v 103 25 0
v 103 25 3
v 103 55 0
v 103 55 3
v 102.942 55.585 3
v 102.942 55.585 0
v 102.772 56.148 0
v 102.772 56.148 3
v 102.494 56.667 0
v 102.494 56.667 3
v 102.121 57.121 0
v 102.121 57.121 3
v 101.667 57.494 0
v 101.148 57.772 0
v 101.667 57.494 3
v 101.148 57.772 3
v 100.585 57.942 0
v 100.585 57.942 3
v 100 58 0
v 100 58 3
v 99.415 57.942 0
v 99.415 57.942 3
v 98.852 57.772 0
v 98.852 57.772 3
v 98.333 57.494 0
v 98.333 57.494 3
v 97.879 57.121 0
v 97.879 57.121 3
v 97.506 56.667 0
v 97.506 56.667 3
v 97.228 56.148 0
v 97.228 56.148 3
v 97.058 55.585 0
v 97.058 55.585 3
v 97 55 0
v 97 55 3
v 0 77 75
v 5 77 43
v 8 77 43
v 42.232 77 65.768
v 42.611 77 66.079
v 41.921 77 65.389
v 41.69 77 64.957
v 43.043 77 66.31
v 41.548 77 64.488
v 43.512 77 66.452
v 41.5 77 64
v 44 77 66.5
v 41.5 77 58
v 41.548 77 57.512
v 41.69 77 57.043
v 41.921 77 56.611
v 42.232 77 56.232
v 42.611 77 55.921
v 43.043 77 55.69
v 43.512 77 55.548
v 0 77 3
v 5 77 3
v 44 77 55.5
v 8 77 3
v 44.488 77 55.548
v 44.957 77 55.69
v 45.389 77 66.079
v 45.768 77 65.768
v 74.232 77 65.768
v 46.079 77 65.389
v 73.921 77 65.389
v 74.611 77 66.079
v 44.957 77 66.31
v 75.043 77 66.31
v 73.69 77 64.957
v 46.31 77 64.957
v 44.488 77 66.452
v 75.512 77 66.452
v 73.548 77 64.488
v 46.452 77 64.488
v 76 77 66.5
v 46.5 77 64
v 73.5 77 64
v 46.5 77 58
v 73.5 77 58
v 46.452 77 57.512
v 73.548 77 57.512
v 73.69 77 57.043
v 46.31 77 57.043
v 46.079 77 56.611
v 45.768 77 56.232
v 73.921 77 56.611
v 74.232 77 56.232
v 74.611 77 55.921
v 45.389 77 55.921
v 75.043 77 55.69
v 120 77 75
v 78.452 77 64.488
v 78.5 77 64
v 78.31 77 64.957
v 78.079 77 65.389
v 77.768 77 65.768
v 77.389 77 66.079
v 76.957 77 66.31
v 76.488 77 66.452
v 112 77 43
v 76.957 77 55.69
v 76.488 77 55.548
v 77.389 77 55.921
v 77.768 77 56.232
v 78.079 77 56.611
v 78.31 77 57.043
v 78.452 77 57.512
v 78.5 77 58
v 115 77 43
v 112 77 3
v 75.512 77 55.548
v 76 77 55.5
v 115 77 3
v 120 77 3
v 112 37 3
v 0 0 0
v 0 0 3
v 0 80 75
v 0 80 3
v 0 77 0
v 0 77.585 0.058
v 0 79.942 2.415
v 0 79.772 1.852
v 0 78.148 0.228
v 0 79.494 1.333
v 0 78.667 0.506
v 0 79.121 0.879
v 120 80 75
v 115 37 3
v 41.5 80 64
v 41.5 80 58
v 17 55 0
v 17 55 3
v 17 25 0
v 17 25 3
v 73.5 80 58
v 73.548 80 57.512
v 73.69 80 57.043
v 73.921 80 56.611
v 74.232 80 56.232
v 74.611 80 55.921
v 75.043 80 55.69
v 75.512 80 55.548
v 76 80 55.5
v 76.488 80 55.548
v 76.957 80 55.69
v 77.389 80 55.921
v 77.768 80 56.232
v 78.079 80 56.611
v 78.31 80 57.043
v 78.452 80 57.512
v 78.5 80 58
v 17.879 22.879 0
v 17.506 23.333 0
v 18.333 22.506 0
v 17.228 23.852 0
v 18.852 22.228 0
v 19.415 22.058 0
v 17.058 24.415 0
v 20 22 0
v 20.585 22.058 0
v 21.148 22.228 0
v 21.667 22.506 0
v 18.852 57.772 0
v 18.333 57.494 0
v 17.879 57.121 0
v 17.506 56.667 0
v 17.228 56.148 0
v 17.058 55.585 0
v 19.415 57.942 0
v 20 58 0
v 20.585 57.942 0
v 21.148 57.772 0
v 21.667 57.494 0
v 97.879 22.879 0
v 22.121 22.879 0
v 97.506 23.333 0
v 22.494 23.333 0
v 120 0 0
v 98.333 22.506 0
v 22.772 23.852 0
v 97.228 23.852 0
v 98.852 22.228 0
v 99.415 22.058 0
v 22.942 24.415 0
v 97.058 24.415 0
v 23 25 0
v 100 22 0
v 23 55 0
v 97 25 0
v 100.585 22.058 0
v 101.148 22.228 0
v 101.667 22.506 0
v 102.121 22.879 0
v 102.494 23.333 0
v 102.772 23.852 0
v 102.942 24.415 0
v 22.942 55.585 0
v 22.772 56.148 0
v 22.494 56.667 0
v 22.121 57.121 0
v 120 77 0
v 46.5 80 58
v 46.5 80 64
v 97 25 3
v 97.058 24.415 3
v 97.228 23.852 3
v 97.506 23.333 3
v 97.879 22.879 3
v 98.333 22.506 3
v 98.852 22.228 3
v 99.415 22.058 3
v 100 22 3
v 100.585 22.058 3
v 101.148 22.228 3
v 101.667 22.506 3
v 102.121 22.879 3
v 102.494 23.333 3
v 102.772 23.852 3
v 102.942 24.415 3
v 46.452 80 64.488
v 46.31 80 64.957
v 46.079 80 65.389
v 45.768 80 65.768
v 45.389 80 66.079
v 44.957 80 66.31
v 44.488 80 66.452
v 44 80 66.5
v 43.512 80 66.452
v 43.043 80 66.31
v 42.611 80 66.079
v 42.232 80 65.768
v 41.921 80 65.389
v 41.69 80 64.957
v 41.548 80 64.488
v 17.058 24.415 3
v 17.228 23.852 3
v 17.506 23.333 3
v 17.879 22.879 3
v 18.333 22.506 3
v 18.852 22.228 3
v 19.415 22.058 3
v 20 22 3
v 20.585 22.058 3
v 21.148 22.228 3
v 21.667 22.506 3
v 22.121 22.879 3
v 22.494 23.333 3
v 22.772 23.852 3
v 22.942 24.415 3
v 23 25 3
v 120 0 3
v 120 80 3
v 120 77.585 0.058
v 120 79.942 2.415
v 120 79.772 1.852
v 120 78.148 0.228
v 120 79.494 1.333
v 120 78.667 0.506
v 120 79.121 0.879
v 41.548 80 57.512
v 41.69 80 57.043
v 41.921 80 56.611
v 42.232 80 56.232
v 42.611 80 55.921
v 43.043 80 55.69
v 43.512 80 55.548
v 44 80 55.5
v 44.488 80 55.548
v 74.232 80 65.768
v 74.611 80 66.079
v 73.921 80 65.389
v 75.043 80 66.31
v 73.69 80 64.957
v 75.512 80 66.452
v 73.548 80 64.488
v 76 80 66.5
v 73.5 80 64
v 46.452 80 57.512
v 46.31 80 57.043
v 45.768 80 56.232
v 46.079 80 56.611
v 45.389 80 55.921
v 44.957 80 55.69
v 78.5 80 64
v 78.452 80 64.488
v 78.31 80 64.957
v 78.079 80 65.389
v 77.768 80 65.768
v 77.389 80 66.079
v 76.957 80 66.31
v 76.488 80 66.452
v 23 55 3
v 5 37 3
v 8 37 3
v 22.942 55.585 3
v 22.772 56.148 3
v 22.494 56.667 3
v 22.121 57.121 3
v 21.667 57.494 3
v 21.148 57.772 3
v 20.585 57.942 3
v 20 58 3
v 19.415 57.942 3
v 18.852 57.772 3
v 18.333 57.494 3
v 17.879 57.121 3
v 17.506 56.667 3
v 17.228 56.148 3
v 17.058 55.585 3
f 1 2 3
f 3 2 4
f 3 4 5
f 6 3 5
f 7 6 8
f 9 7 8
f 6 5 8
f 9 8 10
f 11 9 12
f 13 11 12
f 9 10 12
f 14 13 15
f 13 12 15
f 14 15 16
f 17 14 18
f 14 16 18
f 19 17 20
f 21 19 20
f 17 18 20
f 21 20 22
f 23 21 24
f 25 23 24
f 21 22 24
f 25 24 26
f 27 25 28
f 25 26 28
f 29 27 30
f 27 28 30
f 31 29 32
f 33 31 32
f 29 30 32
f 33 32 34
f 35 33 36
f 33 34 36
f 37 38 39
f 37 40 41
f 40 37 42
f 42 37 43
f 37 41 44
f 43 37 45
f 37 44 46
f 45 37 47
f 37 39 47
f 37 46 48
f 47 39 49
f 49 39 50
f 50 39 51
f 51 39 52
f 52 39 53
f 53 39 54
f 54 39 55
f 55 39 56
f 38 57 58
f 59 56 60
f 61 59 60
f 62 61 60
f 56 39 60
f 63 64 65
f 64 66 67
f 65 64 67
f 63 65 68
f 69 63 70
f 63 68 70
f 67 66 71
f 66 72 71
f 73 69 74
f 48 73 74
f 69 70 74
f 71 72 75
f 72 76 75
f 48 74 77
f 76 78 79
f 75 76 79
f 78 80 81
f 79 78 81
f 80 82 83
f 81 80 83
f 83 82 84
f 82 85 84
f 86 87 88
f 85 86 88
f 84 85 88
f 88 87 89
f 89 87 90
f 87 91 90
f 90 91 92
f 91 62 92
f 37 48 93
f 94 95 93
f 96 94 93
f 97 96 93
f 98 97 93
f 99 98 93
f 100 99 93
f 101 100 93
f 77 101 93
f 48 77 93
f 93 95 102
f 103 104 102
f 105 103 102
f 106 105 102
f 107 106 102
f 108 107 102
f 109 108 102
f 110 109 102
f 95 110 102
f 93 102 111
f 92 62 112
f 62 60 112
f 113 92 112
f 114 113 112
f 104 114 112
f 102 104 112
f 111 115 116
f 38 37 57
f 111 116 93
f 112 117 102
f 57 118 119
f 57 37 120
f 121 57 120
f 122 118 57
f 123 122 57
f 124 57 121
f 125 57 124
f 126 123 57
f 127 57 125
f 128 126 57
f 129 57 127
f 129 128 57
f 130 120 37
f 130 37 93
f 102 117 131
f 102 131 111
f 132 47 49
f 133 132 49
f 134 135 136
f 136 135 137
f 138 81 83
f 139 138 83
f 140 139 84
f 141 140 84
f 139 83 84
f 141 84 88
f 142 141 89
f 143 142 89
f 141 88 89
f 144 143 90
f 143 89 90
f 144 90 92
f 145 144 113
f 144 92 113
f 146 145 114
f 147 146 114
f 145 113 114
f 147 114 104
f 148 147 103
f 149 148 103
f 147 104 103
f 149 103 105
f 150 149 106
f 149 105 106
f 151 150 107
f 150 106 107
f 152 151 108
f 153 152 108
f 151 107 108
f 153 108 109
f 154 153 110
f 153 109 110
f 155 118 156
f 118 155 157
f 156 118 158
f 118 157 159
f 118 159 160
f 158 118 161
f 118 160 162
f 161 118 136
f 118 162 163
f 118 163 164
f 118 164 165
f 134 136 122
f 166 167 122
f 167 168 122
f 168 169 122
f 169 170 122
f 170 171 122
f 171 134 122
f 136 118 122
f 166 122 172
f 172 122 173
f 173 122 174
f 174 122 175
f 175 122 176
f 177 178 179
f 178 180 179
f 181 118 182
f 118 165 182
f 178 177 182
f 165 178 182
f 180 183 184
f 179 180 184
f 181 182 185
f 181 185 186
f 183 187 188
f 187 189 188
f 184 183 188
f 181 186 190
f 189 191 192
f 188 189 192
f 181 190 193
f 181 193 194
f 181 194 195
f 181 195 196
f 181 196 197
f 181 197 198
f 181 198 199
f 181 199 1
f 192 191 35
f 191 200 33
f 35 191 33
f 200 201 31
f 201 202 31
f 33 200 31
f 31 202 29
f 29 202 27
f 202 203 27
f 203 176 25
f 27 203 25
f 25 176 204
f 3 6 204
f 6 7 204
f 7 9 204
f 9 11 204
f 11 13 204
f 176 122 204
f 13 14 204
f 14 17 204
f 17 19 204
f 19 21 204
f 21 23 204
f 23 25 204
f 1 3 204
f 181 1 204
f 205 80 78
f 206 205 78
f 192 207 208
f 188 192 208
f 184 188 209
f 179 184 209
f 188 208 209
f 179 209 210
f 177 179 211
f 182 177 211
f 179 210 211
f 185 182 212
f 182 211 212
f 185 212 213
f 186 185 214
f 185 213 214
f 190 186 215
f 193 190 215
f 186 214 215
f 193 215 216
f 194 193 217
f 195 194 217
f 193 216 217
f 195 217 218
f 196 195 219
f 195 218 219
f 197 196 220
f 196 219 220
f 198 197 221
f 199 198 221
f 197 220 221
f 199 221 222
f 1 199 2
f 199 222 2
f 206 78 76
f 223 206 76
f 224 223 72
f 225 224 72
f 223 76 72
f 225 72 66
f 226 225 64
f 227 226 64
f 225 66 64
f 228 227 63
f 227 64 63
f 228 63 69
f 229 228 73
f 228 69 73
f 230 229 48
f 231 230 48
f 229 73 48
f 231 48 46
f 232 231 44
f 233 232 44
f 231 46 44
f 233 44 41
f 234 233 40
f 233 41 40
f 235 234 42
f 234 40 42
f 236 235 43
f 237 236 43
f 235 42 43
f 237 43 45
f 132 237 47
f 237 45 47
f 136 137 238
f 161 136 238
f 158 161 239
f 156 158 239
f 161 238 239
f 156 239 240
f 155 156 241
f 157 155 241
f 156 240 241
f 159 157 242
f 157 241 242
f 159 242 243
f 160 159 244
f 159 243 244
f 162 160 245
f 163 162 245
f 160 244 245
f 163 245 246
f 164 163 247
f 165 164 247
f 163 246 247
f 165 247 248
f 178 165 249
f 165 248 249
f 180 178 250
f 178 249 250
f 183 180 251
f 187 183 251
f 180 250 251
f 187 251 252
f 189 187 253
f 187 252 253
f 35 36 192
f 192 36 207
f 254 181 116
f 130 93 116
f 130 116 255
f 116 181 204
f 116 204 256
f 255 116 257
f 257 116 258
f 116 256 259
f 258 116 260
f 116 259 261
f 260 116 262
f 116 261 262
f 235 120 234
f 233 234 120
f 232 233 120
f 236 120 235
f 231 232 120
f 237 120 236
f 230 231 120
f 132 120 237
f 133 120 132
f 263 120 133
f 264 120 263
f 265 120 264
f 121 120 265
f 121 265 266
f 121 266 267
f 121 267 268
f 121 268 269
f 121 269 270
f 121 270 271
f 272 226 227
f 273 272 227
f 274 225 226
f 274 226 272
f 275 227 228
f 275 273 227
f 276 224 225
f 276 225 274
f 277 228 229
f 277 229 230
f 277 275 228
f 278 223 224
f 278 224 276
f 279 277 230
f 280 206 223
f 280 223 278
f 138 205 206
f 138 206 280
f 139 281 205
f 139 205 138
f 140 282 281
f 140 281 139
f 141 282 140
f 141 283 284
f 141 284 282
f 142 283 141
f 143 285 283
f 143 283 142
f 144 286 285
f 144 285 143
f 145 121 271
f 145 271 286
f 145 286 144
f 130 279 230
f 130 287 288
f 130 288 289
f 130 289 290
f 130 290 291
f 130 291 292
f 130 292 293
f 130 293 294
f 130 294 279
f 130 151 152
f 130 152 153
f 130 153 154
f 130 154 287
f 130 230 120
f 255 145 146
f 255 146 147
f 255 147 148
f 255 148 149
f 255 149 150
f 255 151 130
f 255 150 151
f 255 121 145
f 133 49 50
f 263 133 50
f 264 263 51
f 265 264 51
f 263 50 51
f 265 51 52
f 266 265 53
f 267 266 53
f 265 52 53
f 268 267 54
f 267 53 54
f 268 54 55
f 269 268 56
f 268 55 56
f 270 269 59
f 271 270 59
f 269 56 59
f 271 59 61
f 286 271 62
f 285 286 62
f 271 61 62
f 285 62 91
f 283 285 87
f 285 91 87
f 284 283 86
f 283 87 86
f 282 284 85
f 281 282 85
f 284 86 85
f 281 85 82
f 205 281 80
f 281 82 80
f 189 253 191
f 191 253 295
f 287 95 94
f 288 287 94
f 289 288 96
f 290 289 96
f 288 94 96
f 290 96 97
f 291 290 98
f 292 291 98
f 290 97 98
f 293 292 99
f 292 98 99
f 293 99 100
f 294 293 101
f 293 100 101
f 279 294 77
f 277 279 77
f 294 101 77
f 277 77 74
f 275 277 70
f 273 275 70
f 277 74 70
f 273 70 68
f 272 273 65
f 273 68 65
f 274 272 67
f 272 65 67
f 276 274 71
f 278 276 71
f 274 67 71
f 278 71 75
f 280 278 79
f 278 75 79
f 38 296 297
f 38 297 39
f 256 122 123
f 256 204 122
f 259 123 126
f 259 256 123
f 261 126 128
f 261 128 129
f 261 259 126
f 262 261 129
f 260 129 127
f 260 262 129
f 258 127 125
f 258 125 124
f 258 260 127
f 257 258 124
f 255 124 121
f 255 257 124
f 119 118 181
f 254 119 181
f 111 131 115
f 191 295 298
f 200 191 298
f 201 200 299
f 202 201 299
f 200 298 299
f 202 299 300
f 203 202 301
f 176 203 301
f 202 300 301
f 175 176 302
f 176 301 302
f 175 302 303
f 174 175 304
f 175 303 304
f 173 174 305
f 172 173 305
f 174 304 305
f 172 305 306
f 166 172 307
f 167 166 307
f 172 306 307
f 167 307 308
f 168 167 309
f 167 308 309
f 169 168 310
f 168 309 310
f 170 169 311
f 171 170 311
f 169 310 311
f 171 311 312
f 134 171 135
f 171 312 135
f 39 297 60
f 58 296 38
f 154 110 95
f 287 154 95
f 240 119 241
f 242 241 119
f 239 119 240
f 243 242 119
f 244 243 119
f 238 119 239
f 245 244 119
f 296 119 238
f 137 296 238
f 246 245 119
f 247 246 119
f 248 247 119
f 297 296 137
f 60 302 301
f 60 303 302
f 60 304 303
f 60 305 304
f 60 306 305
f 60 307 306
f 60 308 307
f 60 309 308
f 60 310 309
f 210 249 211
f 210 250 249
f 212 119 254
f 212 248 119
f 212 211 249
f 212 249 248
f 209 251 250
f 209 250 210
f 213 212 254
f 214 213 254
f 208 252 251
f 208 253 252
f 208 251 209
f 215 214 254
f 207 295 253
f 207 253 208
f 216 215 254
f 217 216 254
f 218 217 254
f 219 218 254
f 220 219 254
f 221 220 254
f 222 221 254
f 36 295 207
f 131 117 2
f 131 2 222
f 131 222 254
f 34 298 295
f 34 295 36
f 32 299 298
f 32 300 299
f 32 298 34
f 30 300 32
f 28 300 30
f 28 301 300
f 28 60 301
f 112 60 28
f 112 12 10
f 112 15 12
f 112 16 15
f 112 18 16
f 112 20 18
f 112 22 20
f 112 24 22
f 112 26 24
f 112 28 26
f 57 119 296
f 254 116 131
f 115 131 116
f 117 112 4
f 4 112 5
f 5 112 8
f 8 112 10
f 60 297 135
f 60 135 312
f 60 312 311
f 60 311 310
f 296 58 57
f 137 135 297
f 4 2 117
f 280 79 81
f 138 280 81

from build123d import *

# Parameters (mm, degrees)
ESQUISSE1_W             = 120
ESQUISSE1_H             = 80
BASE_EXTRUSION_DEPTH    = 3
ESQUISSE2_W             = 120
ESQUISSE2_H             = 3
BOSS_EXTRU_1_DEPTH      = 72
ENL_V_MAT_EXTRU_1_DEPTH = 3
ESQUISSE6_W             = 3
ESQUISSE6_H             = 40
BOSS_EXTRU_2_DEPTH      = 40
ENL_V_MAT_EXTRU_3_DEPTH = 3
ENL_V_MAT_EXTRU_5_DEPTH = 159.902485821
CONG_1_R                = 3


with BuildPart() as part:
    # Esquisse1 → Base-Extrusion (new body)
    with BuildSketch(Plane.XY):
        with Locations((60, 40)):
            Rectangle(ESQUISSE1_W, ESQUISSE1_H)
    extrude(amount=BASE_EXTRUSION_DEPTH)

    # Esquisse2 → Boss.-Extru.1 (add)
    with BuildSketch(Plane.XY.offset(3)):
        with Locations((60, 78.5)):
            Rectangle(ESQUISSE2_W, ESQUISSE2_H)
    extrude(amount=BOSS_EXTRU_1_DEPTH)

    # Esquisse5 → Enlèv. mat.-Extru.1 (cut)
    with BuildSketch(Plane.XY.offset(3)):
        with BuildLine():
            Line((17, 55), (17, 25))
            ThreePointArc((17, 25), (20, 22), (23, 25))
            Line((23, 25), (23, 55))
            ThreePointArc((23, 55), (20, 58), (17, 55))
        make_face()
        with BuildLine():
            Line((97, 55), (97, 25))
            ThreePointArc((97, 25), (100, 22), (103, 25))
            Line((103, 25), (103, 55))
            ThreePointArc((103, 55), (100, 58), (97, 55))
        make_face()
    extrude(amount=-ENL_V_MAT_EXTRU_1_DEPTH, mode=Mode.SUBTRACT)

    # Esquisse6 → Boss.-Extru.2 (add)
    with BuildSketch(Plane.XY.offset(3)):
        with Locations((6.5, 57)):
            Rectangle(ESQUISSE6_W, ESQUISSE6_H)
        with Locations((113.5, 57)):
            Rectangle(ESQUISSE6_W, ESQUISSE6_H)
    extrude(amount=BOSS_EXTRU_2_DEPTH)

    # Esquisse8 → Enlèv. mat.-Extru.3 (cut)
    with BuildSketch(Plane.XZ.offset(-77)):
        with BuildLine():
            Line((41.5, 64), (41.5, 58))
            ThreePointArc((41.5, 58), (44, 55.5), (46.5, 58))
            Line((46.5, 58), (46.5, 64))
            ThreePointArc((46.5, 64), (44, 66.5), (41.5, 64))
        make_face()
        with BuildLine():
            Line((73.5, 64), (73.5, 58))
            ThreePointArc((73.5, 58), (76, 55.5), (78.5, 58))
            Line((78.5, 58), (78.5, 64))
            ThreePointArc((78.5, 64), (76, 66.5), (73.5, 64))
        make_face()
    extrude(amount=-ENL_V_MAT_EXTRU_3_DEPTH, mode=Mode.SUBTRACT)

    # Esquisse10 → Enlèv. mat.-Extru.5 (cut, through all)
    with BuildSketch(Plane.ZY.offset(-5)):
        Polygon((3, 37), (43, 77), (43, 37), align=None)
    extrude(amount=-ENL_V_MAT_EXTRU_5_DEPTH, mode=Mode.SUBTRACT)

    # Congé1
    cong_1_edges = [part.edges().sort_by_distance(p)[0] for p in [
        (60, 80, 0),
    ]]
    fillet(cong_1_edges, radius=CONG_1_R)


solid = part.part
